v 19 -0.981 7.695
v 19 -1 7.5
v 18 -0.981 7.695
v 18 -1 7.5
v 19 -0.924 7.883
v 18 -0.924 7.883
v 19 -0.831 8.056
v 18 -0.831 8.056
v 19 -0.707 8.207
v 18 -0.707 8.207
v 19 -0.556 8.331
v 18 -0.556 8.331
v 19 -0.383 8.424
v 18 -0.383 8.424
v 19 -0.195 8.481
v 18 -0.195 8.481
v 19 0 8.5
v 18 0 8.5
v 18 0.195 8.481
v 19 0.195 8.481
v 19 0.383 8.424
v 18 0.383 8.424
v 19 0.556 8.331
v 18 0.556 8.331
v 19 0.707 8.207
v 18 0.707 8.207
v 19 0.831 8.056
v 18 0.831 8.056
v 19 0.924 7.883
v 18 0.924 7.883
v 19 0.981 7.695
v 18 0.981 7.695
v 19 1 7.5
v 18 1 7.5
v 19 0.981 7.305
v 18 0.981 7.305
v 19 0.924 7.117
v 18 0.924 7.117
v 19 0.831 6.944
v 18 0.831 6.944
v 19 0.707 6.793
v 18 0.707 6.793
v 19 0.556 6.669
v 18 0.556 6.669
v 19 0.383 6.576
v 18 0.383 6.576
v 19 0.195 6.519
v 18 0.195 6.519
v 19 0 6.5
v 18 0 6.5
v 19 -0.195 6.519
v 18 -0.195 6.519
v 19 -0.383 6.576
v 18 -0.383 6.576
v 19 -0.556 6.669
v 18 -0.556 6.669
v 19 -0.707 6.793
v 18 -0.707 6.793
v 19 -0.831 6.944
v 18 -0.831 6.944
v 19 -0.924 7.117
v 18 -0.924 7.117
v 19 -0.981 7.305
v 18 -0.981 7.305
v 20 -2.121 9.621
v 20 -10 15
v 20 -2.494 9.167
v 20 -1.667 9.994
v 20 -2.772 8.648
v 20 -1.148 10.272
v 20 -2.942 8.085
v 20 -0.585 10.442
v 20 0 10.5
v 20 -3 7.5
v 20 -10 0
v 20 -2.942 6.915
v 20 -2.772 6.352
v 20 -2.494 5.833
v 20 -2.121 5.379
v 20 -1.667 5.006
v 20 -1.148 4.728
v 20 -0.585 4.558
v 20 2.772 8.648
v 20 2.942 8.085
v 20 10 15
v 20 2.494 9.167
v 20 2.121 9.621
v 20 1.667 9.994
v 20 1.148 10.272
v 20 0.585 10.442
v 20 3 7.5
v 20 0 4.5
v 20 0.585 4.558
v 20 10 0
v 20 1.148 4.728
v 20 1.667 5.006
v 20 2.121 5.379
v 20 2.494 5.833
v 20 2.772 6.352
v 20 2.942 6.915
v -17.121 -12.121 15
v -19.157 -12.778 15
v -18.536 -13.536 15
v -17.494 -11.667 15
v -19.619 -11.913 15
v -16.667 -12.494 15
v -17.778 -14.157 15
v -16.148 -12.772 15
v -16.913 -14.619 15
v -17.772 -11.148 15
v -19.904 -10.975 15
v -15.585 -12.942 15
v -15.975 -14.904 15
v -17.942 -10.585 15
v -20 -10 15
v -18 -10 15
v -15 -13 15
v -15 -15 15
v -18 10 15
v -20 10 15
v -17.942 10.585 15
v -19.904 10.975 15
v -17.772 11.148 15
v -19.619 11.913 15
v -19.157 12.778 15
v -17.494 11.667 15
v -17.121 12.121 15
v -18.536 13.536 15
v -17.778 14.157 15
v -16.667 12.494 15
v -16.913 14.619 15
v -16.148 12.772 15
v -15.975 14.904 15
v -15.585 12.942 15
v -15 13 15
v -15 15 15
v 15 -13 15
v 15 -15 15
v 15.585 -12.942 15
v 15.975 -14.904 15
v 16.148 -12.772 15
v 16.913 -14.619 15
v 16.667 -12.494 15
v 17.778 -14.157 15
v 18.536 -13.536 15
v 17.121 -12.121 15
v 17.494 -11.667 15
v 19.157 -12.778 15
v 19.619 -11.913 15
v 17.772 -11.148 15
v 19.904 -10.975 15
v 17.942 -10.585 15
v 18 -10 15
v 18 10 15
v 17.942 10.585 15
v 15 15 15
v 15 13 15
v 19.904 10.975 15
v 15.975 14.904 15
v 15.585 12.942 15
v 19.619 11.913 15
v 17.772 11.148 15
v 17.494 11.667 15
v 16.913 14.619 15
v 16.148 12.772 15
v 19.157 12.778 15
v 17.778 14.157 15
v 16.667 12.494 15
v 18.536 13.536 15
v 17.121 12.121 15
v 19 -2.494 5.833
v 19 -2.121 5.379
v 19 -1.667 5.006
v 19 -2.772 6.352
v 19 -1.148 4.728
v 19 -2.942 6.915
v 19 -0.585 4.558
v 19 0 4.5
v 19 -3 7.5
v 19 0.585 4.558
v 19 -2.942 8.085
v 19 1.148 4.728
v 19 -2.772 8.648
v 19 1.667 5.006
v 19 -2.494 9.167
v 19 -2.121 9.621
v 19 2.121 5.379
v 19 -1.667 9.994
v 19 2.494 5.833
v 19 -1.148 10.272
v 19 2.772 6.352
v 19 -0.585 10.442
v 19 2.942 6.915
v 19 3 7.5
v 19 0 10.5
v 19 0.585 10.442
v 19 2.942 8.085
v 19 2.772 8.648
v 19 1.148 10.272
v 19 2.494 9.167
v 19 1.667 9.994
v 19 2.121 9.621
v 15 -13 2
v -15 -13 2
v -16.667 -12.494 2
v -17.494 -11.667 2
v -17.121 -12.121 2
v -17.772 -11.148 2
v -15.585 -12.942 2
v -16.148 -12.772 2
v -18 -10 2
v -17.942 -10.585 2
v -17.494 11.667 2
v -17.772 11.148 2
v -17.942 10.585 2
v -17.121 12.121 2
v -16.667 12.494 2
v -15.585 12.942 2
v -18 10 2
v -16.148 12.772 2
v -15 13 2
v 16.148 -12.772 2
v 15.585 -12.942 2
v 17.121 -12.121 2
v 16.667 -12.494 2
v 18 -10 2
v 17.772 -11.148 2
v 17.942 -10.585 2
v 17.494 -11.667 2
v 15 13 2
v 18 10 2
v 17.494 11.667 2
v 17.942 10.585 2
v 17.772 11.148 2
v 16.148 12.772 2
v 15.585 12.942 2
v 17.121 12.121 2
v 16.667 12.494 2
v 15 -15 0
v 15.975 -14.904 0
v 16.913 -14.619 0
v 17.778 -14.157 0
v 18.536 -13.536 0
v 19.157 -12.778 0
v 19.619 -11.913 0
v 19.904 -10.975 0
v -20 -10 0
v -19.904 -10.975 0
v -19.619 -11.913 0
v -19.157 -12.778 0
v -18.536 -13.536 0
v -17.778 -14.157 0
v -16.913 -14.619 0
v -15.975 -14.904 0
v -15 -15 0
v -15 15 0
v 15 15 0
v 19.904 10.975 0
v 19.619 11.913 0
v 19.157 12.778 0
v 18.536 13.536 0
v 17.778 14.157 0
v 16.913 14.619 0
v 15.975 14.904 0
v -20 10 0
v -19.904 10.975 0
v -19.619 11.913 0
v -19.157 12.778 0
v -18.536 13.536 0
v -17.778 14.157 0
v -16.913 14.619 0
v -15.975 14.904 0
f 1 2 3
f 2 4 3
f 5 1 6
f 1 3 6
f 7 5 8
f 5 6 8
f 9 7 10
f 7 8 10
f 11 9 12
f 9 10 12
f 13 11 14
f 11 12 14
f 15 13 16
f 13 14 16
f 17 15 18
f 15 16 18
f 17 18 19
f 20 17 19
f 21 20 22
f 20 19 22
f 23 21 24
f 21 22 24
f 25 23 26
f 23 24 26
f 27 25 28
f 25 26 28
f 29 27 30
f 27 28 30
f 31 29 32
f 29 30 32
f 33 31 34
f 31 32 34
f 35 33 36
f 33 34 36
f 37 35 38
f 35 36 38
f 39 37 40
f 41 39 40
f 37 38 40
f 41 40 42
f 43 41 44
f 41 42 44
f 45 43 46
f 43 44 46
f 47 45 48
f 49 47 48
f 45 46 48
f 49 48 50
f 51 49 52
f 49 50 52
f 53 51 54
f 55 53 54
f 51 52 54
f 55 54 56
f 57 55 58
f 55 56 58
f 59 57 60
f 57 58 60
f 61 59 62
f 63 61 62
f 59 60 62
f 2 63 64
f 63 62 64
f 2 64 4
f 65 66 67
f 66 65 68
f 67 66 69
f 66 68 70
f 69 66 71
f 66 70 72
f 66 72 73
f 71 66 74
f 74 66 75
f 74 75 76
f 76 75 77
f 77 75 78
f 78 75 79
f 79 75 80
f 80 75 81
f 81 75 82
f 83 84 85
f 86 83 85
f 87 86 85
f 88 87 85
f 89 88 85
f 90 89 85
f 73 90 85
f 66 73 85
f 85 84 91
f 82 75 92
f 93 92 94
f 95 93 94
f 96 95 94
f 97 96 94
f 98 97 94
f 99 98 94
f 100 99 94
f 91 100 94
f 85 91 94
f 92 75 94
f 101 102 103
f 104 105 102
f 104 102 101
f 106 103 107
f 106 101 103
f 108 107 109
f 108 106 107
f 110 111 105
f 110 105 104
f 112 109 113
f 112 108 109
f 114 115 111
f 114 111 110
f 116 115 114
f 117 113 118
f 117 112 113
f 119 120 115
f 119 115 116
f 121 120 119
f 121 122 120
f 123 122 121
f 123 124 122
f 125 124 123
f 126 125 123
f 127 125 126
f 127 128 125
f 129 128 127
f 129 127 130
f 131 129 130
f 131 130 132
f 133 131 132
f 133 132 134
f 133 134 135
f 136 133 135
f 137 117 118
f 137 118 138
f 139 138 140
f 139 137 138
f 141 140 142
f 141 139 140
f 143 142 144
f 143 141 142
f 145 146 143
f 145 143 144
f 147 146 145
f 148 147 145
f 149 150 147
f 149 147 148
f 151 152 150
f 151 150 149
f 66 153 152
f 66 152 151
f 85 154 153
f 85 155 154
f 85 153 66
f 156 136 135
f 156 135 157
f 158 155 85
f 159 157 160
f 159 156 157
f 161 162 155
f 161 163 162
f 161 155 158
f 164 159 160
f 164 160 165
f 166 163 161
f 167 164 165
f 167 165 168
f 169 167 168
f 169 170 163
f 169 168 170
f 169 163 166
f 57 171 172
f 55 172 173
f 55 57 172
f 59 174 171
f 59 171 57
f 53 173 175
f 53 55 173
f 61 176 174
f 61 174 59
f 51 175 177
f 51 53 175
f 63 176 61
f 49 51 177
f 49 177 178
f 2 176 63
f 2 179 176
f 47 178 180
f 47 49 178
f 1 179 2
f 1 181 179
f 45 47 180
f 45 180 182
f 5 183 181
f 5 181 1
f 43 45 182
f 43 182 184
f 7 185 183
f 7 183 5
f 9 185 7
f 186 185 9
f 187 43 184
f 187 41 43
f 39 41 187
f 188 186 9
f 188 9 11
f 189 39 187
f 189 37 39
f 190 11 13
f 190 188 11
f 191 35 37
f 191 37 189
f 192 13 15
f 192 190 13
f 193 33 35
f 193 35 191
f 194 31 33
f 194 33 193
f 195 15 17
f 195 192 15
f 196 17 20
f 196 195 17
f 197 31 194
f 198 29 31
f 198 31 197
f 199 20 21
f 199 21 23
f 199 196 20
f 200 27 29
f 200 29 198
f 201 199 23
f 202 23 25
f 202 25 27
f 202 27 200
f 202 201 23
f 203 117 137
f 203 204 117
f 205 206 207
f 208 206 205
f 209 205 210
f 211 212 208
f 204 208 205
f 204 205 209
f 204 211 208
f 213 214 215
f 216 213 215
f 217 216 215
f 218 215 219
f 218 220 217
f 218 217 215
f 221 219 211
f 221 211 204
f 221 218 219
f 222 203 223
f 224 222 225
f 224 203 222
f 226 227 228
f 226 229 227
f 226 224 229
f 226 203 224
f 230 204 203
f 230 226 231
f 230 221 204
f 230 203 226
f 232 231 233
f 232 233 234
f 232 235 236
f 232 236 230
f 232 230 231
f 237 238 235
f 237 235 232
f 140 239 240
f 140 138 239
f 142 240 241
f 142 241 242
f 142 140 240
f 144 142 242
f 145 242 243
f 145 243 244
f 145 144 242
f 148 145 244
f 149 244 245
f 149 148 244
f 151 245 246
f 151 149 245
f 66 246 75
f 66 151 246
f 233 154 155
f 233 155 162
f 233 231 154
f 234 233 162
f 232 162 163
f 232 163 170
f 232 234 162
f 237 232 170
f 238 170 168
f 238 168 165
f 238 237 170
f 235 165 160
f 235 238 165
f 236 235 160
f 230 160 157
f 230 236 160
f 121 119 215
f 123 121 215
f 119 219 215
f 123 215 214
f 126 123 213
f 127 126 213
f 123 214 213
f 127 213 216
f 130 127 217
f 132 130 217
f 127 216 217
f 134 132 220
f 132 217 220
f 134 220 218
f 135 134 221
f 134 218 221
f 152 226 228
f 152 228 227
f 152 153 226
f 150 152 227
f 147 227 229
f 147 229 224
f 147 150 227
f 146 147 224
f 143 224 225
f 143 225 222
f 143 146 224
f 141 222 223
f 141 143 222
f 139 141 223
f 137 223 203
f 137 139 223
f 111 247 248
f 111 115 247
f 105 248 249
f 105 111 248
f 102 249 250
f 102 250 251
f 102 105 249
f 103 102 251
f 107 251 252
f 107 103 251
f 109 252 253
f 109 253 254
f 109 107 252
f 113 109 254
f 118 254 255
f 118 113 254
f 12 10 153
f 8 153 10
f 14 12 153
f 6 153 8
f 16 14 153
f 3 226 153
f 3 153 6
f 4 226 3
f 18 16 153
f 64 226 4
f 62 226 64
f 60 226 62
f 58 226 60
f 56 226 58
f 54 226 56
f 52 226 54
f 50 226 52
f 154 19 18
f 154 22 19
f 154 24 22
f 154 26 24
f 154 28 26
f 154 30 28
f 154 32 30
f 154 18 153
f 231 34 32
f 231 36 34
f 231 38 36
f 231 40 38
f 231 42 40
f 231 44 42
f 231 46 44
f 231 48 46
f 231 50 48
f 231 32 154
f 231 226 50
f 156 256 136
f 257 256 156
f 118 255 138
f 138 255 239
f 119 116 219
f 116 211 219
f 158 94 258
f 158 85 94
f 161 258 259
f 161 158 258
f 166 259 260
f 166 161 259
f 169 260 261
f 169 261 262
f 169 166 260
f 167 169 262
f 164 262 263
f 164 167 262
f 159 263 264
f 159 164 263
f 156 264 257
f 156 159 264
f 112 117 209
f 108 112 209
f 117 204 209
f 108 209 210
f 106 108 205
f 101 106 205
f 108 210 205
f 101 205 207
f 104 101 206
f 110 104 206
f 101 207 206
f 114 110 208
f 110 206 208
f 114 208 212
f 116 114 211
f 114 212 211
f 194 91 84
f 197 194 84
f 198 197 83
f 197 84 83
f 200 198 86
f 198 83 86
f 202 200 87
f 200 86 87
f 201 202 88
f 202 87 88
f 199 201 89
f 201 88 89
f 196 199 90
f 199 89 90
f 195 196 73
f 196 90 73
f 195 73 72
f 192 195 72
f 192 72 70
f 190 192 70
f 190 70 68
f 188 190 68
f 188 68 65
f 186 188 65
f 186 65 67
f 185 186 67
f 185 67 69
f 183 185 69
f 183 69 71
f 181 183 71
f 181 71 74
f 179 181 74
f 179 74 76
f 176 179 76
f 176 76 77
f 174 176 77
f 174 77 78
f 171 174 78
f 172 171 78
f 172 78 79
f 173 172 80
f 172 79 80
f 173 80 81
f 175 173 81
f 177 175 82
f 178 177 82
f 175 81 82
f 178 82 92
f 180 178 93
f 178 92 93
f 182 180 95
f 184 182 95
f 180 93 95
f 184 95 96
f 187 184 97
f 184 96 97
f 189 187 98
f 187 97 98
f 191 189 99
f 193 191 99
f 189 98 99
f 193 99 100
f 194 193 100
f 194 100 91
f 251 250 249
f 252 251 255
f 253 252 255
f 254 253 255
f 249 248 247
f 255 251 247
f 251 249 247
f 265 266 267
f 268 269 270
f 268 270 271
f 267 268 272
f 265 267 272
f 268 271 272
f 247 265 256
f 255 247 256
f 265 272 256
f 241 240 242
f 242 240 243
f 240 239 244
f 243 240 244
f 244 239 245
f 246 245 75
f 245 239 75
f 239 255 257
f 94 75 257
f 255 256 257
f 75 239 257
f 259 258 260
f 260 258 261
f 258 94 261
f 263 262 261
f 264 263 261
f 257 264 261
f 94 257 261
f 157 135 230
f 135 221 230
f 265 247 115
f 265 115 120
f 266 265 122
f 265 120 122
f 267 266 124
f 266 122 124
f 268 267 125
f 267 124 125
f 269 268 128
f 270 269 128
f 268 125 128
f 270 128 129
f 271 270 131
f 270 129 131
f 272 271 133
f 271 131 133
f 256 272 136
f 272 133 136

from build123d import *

# Parameters (mm, degrees)
F0_W           = 40
F0_H           = 30
F1_DEPTH       = 15
F2_T           = -2
F3_R           = 5
F4_R           = 3
F6_D           = 2
F6_DEPTH       = 12
F6_CBORE_D     = 6
F6_CBORE_DEPTH = 1
F6_TIP         = 0.600860619


with BuildPart() as f1:
    # F0 (on Top) → F1 (new body)
    with BuildSketch(Plane.XY):
        Rectangle(F0_W, F0_H)
    extrude(amount=F1_DEPTH)

    # F2
    f2_openings = [f1.faces().sort_by_distance(p)[0] for p in [
        (0, 0, 15),
    ]]
    offset(amount=F2_T, openings=f2_openings)

    # F3
    f3_edges = [f1.edges().sort_by_distance(p)[0] for p in [
        (20, -15, 7.5),
        (20, 15, 7.5),
        (-20, -15, 7.5),
        (-20, 15, 7.5),
    ]]
    fillet(f3_edges, radius=F3_R)

    # F4
    f4_edges = [f1.edges().sort_by_distance(p)[0] for p in [
        (-18, 13, 8.5),
        (-18, -13, 8.5),
        (18, 13, 8.5),
        (18, -13, 8.5),
    ]]
    fillet(f4_edges, radius=F4_R)

    # F6
    with Locations(Plane.YZ.offset(20)):
        with Locations((0, 7.5)):
            CounterBoreHole(F6_D / 2, F6_CBORE_D / 2, F6_CBORE_DEPTH, depth=F6_DEPTH)
            with Locations((0, 0, -(F6_DEPTH + F6_TIP / 2))):  # 118° drill point
                Cone(0, F6_D / 2, F6_TIP, mode=Mode.SUBTRACT)


solid = f1.part
